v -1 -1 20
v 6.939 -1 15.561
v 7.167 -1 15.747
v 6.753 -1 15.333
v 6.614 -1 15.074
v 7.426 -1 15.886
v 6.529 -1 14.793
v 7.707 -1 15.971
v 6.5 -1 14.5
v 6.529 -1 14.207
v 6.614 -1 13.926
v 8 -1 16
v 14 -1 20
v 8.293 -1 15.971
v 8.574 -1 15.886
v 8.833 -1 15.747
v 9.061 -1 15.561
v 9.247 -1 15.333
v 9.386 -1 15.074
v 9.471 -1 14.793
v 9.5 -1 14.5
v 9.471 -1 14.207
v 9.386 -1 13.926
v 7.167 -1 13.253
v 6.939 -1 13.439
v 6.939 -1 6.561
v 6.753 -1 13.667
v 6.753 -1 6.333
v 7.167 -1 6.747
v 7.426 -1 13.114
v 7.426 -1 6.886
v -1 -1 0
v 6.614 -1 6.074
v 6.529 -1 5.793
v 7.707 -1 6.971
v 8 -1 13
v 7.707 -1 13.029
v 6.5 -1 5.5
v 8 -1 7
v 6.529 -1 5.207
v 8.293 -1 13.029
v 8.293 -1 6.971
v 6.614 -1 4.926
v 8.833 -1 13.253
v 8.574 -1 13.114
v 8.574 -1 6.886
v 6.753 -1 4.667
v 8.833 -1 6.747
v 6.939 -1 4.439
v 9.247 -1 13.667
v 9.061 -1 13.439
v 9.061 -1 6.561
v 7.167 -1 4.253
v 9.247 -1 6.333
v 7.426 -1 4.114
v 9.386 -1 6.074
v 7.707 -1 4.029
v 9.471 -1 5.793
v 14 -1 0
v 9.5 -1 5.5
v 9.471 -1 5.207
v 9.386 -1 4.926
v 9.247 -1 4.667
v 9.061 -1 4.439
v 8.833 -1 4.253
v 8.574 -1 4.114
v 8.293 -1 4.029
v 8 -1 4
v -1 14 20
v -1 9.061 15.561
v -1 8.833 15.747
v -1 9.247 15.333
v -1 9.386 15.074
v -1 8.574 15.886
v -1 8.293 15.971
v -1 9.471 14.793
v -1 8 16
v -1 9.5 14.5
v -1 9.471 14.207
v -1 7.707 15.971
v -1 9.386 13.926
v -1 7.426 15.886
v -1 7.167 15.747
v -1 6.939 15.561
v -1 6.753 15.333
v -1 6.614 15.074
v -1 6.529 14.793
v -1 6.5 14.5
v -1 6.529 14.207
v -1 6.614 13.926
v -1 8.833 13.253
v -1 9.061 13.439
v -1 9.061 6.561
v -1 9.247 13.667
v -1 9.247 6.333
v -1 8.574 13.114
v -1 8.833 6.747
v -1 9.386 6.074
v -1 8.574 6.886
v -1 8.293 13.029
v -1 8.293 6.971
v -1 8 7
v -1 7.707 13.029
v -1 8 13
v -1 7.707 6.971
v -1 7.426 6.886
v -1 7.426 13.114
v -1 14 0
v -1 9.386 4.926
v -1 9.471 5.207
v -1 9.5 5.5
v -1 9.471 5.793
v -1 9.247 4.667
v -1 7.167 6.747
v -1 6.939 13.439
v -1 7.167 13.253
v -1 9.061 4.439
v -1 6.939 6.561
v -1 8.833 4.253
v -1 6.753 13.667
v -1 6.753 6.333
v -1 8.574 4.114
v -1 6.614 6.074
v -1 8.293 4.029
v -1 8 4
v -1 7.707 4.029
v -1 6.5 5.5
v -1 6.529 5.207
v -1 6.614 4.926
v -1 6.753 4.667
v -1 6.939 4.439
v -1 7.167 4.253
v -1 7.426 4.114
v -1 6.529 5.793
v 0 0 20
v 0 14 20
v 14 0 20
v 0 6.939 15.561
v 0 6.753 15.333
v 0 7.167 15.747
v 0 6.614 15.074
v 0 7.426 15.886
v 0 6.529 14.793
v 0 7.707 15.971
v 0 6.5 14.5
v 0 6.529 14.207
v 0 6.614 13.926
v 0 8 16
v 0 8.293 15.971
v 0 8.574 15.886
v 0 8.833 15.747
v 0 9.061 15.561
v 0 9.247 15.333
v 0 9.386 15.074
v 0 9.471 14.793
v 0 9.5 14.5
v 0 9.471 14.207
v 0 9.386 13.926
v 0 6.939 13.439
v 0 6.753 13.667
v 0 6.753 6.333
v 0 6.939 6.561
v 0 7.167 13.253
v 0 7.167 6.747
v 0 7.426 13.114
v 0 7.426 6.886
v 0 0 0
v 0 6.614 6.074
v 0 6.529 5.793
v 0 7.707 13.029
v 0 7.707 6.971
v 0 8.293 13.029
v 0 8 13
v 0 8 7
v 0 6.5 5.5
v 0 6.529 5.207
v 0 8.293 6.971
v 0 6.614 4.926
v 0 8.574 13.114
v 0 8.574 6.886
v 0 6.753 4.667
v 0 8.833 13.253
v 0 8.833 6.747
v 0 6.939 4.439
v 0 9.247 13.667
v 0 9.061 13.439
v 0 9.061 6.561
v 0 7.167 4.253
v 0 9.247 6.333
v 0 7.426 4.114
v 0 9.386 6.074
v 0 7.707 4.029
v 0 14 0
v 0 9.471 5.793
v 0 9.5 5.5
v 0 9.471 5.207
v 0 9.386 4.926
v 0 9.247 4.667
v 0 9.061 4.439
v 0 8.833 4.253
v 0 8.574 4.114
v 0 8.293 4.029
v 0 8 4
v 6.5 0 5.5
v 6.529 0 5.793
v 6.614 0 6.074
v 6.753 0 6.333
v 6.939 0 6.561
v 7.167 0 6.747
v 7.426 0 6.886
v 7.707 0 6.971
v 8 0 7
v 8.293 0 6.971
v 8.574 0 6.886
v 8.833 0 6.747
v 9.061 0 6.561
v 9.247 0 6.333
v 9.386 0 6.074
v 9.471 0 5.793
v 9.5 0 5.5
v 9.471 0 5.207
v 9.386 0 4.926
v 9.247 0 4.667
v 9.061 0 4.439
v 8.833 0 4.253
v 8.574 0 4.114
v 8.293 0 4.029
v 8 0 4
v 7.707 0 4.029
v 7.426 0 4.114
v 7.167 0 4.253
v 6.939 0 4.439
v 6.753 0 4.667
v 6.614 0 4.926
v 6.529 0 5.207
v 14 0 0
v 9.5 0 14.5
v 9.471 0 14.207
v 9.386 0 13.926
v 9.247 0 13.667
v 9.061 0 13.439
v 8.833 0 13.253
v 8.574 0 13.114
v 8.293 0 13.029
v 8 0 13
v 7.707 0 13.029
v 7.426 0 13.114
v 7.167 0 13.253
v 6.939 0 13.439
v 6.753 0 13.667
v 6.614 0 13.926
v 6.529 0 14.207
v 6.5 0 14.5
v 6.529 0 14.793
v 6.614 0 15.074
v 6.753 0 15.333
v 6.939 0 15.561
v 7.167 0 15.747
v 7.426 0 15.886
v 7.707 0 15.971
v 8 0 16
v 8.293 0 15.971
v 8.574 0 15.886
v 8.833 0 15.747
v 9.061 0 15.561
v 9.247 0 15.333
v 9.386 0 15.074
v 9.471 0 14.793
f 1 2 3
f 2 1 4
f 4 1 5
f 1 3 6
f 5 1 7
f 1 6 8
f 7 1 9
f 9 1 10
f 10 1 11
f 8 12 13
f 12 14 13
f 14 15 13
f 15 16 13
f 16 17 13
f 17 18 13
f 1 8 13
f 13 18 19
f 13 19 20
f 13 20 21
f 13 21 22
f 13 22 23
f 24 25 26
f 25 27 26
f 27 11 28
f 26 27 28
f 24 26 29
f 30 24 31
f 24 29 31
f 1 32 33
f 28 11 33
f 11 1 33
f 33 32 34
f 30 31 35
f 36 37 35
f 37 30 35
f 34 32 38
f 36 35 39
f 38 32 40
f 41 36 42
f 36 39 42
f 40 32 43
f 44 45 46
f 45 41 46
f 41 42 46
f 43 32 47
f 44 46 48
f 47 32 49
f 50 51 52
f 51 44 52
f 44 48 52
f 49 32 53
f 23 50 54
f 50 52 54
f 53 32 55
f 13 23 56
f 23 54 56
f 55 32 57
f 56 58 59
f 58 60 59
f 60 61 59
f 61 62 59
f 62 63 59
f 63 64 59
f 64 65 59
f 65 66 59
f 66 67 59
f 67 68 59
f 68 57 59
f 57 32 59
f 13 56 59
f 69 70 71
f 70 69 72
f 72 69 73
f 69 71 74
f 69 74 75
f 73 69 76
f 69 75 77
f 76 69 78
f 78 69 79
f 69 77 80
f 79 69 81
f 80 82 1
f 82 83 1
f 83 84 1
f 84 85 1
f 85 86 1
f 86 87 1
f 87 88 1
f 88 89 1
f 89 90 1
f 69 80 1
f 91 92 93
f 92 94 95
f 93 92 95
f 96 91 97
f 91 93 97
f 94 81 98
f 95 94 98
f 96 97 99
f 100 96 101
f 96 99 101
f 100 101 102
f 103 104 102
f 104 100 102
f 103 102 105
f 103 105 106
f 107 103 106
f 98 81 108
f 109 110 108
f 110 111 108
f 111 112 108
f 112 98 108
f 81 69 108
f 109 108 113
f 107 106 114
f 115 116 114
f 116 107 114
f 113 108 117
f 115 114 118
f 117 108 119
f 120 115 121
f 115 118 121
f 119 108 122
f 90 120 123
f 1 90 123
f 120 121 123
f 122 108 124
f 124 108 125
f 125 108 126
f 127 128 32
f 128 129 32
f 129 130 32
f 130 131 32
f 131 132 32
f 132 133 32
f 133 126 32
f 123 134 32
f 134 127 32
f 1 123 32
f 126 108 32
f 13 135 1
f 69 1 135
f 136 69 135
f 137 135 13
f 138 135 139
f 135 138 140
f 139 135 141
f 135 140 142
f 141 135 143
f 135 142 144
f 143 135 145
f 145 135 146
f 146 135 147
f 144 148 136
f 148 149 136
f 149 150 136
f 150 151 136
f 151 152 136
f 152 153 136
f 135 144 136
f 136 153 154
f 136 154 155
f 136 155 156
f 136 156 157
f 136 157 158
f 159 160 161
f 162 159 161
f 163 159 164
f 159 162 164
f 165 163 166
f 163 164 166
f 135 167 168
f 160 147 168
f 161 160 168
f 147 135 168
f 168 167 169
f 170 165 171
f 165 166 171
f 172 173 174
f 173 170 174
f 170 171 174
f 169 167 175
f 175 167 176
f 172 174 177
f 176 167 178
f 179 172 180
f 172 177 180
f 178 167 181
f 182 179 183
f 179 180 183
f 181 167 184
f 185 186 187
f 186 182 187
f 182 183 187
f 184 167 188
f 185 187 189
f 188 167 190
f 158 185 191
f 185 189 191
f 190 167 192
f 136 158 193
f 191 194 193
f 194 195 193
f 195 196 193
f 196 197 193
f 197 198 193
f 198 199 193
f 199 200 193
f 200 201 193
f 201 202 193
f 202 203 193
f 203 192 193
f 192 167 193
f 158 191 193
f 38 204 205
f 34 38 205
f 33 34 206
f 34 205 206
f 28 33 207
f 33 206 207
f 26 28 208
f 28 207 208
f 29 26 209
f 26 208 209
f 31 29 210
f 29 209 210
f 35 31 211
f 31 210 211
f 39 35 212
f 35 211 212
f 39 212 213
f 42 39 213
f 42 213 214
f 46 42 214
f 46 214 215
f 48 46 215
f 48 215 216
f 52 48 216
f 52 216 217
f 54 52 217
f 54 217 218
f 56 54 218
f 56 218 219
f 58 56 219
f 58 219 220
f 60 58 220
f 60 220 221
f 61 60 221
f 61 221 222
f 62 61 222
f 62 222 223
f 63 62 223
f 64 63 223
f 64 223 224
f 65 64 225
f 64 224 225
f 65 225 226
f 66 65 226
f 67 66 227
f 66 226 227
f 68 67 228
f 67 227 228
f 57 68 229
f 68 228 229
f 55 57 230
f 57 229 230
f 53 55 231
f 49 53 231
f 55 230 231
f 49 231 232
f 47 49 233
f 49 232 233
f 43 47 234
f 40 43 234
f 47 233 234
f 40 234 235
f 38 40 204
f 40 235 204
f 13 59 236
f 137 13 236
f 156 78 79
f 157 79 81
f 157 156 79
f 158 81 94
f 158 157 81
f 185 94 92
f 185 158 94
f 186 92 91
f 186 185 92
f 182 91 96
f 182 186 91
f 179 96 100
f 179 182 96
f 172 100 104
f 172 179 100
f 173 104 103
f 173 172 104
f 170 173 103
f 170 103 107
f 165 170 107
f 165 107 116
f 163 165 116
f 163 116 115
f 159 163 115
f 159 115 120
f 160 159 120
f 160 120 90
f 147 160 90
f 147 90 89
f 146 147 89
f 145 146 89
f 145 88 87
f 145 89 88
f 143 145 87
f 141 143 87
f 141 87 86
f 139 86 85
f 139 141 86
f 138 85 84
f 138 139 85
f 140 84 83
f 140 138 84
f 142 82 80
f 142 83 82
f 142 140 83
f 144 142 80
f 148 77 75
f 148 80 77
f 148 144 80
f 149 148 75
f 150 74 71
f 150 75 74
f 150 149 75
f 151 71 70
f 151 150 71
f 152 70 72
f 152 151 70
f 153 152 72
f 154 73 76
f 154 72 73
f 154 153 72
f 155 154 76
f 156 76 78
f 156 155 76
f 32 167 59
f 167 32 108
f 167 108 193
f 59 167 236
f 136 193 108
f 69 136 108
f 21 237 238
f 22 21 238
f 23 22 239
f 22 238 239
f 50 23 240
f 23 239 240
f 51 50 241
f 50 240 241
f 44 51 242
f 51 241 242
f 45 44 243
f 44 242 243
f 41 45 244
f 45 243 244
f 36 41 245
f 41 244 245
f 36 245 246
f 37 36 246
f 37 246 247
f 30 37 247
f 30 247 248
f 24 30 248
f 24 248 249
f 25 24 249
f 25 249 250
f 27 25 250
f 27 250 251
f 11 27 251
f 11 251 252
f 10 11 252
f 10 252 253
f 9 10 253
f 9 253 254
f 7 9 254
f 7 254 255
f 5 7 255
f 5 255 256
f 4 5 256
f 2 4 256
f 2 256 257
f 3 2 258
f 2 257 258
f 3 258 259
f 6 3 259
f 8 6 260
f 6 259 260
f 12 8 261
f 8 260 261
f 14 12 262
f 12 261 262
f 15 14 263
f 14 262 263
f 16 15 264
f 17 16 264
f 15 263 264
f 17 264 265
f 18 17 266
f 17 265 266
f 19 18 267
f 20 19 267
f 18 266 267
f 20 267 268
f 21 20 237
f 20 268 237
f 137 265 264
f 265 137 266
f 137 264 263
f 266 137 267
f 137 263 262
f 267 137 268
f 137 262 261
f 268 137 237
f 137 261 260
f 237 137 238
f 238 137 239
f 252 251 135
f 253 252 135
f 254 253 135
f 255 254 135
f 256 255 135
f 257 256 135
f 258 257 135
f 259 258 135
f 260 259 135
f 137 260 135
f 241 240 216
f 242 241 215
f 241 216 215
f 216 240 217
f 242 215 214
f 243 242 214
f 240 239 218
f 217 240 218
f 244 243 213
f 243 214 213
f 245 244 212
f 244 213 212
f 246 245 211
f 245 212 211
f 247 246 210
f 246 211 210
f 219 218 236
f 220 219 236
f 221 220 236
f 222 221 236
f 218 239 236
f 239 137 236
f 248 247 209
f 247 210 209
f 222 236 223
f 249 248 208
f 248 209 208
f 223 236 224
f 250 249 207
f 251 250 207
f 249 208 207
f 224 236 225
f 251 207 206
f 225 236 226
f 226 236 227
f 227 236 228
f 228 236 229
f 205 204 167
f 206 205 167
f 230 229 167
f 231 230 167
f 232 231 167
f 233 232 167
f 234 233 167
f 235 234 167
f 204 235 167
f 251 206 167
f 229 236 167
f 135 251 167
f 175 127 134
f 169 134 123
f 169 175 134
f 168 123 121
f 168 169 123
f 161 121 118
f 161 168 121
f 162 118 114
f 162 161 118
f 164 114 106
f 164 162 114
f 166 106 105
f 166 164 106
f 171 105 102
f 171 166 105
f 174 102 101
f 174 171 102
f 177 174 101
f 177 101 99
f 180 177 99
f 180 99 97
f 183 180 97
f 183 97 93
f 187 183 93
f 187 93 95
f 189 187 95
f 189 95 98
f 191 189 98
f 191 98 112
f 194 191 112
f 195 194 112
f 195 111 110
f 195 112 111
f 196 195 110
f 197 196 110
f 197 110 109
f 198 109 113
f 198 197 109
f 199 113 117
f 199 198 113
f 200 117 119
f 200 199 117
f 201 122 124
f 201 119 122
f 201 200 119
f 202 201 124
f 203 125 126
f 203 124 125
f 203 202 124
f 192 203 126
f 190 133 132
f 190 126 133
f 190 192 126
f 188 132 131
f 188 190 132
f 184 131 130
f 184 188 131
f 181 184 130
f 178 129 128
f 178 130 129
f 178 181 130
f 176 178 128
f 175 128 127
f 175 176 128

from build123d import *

# Parameters (mm, degrees)
EXTRUDE_1_DEPTH     = 20
SKETCH_2_R          = 1.5
CUT_EXTRUDE_1_DEPTH = 29.142494559


with BuildPart() as part:
    # 草图1 → 凸台-拉伸1 (new body)
    with BuildSketch(Plane.XY):
        Polygon((0, 0), (0, 14), (-1, 14), (-1, -1), (14, -1), (14, 0), align=None)
    extrude(amount=EXTRUDE_1_DEPTH)

    # 草图2 → 切除-拉伸1 (cut, through all)
    with BuildSketch(Plane(origin=(0, 0, 0), x_dir=(1, 0, 0), z_dir=(0, 1, 0))):
        with Locations(Location((8, -5.5, 0), (0, 0, 180))):
            Circle(SKETCH_2_R)
        with Locations((8, -14.5)):
            Circle(SKETCH_2_R)
    cut_extrude_1 = extrude(amount=-CUT_EXTRUDE_1_DEPTH, mode=Mode.SUBTRACT)

    # 镜向1: 切除-拉伸1 across plane
    add(cut_extrude_1.mirror(Plane(origin=(0, 0, 0), x_dir=(0, 0, 1), z_dir=(-0.7071067811865476, 0.7071067811865475, 0))), mode=Mode.SUBTRACT)


solid = part.part
